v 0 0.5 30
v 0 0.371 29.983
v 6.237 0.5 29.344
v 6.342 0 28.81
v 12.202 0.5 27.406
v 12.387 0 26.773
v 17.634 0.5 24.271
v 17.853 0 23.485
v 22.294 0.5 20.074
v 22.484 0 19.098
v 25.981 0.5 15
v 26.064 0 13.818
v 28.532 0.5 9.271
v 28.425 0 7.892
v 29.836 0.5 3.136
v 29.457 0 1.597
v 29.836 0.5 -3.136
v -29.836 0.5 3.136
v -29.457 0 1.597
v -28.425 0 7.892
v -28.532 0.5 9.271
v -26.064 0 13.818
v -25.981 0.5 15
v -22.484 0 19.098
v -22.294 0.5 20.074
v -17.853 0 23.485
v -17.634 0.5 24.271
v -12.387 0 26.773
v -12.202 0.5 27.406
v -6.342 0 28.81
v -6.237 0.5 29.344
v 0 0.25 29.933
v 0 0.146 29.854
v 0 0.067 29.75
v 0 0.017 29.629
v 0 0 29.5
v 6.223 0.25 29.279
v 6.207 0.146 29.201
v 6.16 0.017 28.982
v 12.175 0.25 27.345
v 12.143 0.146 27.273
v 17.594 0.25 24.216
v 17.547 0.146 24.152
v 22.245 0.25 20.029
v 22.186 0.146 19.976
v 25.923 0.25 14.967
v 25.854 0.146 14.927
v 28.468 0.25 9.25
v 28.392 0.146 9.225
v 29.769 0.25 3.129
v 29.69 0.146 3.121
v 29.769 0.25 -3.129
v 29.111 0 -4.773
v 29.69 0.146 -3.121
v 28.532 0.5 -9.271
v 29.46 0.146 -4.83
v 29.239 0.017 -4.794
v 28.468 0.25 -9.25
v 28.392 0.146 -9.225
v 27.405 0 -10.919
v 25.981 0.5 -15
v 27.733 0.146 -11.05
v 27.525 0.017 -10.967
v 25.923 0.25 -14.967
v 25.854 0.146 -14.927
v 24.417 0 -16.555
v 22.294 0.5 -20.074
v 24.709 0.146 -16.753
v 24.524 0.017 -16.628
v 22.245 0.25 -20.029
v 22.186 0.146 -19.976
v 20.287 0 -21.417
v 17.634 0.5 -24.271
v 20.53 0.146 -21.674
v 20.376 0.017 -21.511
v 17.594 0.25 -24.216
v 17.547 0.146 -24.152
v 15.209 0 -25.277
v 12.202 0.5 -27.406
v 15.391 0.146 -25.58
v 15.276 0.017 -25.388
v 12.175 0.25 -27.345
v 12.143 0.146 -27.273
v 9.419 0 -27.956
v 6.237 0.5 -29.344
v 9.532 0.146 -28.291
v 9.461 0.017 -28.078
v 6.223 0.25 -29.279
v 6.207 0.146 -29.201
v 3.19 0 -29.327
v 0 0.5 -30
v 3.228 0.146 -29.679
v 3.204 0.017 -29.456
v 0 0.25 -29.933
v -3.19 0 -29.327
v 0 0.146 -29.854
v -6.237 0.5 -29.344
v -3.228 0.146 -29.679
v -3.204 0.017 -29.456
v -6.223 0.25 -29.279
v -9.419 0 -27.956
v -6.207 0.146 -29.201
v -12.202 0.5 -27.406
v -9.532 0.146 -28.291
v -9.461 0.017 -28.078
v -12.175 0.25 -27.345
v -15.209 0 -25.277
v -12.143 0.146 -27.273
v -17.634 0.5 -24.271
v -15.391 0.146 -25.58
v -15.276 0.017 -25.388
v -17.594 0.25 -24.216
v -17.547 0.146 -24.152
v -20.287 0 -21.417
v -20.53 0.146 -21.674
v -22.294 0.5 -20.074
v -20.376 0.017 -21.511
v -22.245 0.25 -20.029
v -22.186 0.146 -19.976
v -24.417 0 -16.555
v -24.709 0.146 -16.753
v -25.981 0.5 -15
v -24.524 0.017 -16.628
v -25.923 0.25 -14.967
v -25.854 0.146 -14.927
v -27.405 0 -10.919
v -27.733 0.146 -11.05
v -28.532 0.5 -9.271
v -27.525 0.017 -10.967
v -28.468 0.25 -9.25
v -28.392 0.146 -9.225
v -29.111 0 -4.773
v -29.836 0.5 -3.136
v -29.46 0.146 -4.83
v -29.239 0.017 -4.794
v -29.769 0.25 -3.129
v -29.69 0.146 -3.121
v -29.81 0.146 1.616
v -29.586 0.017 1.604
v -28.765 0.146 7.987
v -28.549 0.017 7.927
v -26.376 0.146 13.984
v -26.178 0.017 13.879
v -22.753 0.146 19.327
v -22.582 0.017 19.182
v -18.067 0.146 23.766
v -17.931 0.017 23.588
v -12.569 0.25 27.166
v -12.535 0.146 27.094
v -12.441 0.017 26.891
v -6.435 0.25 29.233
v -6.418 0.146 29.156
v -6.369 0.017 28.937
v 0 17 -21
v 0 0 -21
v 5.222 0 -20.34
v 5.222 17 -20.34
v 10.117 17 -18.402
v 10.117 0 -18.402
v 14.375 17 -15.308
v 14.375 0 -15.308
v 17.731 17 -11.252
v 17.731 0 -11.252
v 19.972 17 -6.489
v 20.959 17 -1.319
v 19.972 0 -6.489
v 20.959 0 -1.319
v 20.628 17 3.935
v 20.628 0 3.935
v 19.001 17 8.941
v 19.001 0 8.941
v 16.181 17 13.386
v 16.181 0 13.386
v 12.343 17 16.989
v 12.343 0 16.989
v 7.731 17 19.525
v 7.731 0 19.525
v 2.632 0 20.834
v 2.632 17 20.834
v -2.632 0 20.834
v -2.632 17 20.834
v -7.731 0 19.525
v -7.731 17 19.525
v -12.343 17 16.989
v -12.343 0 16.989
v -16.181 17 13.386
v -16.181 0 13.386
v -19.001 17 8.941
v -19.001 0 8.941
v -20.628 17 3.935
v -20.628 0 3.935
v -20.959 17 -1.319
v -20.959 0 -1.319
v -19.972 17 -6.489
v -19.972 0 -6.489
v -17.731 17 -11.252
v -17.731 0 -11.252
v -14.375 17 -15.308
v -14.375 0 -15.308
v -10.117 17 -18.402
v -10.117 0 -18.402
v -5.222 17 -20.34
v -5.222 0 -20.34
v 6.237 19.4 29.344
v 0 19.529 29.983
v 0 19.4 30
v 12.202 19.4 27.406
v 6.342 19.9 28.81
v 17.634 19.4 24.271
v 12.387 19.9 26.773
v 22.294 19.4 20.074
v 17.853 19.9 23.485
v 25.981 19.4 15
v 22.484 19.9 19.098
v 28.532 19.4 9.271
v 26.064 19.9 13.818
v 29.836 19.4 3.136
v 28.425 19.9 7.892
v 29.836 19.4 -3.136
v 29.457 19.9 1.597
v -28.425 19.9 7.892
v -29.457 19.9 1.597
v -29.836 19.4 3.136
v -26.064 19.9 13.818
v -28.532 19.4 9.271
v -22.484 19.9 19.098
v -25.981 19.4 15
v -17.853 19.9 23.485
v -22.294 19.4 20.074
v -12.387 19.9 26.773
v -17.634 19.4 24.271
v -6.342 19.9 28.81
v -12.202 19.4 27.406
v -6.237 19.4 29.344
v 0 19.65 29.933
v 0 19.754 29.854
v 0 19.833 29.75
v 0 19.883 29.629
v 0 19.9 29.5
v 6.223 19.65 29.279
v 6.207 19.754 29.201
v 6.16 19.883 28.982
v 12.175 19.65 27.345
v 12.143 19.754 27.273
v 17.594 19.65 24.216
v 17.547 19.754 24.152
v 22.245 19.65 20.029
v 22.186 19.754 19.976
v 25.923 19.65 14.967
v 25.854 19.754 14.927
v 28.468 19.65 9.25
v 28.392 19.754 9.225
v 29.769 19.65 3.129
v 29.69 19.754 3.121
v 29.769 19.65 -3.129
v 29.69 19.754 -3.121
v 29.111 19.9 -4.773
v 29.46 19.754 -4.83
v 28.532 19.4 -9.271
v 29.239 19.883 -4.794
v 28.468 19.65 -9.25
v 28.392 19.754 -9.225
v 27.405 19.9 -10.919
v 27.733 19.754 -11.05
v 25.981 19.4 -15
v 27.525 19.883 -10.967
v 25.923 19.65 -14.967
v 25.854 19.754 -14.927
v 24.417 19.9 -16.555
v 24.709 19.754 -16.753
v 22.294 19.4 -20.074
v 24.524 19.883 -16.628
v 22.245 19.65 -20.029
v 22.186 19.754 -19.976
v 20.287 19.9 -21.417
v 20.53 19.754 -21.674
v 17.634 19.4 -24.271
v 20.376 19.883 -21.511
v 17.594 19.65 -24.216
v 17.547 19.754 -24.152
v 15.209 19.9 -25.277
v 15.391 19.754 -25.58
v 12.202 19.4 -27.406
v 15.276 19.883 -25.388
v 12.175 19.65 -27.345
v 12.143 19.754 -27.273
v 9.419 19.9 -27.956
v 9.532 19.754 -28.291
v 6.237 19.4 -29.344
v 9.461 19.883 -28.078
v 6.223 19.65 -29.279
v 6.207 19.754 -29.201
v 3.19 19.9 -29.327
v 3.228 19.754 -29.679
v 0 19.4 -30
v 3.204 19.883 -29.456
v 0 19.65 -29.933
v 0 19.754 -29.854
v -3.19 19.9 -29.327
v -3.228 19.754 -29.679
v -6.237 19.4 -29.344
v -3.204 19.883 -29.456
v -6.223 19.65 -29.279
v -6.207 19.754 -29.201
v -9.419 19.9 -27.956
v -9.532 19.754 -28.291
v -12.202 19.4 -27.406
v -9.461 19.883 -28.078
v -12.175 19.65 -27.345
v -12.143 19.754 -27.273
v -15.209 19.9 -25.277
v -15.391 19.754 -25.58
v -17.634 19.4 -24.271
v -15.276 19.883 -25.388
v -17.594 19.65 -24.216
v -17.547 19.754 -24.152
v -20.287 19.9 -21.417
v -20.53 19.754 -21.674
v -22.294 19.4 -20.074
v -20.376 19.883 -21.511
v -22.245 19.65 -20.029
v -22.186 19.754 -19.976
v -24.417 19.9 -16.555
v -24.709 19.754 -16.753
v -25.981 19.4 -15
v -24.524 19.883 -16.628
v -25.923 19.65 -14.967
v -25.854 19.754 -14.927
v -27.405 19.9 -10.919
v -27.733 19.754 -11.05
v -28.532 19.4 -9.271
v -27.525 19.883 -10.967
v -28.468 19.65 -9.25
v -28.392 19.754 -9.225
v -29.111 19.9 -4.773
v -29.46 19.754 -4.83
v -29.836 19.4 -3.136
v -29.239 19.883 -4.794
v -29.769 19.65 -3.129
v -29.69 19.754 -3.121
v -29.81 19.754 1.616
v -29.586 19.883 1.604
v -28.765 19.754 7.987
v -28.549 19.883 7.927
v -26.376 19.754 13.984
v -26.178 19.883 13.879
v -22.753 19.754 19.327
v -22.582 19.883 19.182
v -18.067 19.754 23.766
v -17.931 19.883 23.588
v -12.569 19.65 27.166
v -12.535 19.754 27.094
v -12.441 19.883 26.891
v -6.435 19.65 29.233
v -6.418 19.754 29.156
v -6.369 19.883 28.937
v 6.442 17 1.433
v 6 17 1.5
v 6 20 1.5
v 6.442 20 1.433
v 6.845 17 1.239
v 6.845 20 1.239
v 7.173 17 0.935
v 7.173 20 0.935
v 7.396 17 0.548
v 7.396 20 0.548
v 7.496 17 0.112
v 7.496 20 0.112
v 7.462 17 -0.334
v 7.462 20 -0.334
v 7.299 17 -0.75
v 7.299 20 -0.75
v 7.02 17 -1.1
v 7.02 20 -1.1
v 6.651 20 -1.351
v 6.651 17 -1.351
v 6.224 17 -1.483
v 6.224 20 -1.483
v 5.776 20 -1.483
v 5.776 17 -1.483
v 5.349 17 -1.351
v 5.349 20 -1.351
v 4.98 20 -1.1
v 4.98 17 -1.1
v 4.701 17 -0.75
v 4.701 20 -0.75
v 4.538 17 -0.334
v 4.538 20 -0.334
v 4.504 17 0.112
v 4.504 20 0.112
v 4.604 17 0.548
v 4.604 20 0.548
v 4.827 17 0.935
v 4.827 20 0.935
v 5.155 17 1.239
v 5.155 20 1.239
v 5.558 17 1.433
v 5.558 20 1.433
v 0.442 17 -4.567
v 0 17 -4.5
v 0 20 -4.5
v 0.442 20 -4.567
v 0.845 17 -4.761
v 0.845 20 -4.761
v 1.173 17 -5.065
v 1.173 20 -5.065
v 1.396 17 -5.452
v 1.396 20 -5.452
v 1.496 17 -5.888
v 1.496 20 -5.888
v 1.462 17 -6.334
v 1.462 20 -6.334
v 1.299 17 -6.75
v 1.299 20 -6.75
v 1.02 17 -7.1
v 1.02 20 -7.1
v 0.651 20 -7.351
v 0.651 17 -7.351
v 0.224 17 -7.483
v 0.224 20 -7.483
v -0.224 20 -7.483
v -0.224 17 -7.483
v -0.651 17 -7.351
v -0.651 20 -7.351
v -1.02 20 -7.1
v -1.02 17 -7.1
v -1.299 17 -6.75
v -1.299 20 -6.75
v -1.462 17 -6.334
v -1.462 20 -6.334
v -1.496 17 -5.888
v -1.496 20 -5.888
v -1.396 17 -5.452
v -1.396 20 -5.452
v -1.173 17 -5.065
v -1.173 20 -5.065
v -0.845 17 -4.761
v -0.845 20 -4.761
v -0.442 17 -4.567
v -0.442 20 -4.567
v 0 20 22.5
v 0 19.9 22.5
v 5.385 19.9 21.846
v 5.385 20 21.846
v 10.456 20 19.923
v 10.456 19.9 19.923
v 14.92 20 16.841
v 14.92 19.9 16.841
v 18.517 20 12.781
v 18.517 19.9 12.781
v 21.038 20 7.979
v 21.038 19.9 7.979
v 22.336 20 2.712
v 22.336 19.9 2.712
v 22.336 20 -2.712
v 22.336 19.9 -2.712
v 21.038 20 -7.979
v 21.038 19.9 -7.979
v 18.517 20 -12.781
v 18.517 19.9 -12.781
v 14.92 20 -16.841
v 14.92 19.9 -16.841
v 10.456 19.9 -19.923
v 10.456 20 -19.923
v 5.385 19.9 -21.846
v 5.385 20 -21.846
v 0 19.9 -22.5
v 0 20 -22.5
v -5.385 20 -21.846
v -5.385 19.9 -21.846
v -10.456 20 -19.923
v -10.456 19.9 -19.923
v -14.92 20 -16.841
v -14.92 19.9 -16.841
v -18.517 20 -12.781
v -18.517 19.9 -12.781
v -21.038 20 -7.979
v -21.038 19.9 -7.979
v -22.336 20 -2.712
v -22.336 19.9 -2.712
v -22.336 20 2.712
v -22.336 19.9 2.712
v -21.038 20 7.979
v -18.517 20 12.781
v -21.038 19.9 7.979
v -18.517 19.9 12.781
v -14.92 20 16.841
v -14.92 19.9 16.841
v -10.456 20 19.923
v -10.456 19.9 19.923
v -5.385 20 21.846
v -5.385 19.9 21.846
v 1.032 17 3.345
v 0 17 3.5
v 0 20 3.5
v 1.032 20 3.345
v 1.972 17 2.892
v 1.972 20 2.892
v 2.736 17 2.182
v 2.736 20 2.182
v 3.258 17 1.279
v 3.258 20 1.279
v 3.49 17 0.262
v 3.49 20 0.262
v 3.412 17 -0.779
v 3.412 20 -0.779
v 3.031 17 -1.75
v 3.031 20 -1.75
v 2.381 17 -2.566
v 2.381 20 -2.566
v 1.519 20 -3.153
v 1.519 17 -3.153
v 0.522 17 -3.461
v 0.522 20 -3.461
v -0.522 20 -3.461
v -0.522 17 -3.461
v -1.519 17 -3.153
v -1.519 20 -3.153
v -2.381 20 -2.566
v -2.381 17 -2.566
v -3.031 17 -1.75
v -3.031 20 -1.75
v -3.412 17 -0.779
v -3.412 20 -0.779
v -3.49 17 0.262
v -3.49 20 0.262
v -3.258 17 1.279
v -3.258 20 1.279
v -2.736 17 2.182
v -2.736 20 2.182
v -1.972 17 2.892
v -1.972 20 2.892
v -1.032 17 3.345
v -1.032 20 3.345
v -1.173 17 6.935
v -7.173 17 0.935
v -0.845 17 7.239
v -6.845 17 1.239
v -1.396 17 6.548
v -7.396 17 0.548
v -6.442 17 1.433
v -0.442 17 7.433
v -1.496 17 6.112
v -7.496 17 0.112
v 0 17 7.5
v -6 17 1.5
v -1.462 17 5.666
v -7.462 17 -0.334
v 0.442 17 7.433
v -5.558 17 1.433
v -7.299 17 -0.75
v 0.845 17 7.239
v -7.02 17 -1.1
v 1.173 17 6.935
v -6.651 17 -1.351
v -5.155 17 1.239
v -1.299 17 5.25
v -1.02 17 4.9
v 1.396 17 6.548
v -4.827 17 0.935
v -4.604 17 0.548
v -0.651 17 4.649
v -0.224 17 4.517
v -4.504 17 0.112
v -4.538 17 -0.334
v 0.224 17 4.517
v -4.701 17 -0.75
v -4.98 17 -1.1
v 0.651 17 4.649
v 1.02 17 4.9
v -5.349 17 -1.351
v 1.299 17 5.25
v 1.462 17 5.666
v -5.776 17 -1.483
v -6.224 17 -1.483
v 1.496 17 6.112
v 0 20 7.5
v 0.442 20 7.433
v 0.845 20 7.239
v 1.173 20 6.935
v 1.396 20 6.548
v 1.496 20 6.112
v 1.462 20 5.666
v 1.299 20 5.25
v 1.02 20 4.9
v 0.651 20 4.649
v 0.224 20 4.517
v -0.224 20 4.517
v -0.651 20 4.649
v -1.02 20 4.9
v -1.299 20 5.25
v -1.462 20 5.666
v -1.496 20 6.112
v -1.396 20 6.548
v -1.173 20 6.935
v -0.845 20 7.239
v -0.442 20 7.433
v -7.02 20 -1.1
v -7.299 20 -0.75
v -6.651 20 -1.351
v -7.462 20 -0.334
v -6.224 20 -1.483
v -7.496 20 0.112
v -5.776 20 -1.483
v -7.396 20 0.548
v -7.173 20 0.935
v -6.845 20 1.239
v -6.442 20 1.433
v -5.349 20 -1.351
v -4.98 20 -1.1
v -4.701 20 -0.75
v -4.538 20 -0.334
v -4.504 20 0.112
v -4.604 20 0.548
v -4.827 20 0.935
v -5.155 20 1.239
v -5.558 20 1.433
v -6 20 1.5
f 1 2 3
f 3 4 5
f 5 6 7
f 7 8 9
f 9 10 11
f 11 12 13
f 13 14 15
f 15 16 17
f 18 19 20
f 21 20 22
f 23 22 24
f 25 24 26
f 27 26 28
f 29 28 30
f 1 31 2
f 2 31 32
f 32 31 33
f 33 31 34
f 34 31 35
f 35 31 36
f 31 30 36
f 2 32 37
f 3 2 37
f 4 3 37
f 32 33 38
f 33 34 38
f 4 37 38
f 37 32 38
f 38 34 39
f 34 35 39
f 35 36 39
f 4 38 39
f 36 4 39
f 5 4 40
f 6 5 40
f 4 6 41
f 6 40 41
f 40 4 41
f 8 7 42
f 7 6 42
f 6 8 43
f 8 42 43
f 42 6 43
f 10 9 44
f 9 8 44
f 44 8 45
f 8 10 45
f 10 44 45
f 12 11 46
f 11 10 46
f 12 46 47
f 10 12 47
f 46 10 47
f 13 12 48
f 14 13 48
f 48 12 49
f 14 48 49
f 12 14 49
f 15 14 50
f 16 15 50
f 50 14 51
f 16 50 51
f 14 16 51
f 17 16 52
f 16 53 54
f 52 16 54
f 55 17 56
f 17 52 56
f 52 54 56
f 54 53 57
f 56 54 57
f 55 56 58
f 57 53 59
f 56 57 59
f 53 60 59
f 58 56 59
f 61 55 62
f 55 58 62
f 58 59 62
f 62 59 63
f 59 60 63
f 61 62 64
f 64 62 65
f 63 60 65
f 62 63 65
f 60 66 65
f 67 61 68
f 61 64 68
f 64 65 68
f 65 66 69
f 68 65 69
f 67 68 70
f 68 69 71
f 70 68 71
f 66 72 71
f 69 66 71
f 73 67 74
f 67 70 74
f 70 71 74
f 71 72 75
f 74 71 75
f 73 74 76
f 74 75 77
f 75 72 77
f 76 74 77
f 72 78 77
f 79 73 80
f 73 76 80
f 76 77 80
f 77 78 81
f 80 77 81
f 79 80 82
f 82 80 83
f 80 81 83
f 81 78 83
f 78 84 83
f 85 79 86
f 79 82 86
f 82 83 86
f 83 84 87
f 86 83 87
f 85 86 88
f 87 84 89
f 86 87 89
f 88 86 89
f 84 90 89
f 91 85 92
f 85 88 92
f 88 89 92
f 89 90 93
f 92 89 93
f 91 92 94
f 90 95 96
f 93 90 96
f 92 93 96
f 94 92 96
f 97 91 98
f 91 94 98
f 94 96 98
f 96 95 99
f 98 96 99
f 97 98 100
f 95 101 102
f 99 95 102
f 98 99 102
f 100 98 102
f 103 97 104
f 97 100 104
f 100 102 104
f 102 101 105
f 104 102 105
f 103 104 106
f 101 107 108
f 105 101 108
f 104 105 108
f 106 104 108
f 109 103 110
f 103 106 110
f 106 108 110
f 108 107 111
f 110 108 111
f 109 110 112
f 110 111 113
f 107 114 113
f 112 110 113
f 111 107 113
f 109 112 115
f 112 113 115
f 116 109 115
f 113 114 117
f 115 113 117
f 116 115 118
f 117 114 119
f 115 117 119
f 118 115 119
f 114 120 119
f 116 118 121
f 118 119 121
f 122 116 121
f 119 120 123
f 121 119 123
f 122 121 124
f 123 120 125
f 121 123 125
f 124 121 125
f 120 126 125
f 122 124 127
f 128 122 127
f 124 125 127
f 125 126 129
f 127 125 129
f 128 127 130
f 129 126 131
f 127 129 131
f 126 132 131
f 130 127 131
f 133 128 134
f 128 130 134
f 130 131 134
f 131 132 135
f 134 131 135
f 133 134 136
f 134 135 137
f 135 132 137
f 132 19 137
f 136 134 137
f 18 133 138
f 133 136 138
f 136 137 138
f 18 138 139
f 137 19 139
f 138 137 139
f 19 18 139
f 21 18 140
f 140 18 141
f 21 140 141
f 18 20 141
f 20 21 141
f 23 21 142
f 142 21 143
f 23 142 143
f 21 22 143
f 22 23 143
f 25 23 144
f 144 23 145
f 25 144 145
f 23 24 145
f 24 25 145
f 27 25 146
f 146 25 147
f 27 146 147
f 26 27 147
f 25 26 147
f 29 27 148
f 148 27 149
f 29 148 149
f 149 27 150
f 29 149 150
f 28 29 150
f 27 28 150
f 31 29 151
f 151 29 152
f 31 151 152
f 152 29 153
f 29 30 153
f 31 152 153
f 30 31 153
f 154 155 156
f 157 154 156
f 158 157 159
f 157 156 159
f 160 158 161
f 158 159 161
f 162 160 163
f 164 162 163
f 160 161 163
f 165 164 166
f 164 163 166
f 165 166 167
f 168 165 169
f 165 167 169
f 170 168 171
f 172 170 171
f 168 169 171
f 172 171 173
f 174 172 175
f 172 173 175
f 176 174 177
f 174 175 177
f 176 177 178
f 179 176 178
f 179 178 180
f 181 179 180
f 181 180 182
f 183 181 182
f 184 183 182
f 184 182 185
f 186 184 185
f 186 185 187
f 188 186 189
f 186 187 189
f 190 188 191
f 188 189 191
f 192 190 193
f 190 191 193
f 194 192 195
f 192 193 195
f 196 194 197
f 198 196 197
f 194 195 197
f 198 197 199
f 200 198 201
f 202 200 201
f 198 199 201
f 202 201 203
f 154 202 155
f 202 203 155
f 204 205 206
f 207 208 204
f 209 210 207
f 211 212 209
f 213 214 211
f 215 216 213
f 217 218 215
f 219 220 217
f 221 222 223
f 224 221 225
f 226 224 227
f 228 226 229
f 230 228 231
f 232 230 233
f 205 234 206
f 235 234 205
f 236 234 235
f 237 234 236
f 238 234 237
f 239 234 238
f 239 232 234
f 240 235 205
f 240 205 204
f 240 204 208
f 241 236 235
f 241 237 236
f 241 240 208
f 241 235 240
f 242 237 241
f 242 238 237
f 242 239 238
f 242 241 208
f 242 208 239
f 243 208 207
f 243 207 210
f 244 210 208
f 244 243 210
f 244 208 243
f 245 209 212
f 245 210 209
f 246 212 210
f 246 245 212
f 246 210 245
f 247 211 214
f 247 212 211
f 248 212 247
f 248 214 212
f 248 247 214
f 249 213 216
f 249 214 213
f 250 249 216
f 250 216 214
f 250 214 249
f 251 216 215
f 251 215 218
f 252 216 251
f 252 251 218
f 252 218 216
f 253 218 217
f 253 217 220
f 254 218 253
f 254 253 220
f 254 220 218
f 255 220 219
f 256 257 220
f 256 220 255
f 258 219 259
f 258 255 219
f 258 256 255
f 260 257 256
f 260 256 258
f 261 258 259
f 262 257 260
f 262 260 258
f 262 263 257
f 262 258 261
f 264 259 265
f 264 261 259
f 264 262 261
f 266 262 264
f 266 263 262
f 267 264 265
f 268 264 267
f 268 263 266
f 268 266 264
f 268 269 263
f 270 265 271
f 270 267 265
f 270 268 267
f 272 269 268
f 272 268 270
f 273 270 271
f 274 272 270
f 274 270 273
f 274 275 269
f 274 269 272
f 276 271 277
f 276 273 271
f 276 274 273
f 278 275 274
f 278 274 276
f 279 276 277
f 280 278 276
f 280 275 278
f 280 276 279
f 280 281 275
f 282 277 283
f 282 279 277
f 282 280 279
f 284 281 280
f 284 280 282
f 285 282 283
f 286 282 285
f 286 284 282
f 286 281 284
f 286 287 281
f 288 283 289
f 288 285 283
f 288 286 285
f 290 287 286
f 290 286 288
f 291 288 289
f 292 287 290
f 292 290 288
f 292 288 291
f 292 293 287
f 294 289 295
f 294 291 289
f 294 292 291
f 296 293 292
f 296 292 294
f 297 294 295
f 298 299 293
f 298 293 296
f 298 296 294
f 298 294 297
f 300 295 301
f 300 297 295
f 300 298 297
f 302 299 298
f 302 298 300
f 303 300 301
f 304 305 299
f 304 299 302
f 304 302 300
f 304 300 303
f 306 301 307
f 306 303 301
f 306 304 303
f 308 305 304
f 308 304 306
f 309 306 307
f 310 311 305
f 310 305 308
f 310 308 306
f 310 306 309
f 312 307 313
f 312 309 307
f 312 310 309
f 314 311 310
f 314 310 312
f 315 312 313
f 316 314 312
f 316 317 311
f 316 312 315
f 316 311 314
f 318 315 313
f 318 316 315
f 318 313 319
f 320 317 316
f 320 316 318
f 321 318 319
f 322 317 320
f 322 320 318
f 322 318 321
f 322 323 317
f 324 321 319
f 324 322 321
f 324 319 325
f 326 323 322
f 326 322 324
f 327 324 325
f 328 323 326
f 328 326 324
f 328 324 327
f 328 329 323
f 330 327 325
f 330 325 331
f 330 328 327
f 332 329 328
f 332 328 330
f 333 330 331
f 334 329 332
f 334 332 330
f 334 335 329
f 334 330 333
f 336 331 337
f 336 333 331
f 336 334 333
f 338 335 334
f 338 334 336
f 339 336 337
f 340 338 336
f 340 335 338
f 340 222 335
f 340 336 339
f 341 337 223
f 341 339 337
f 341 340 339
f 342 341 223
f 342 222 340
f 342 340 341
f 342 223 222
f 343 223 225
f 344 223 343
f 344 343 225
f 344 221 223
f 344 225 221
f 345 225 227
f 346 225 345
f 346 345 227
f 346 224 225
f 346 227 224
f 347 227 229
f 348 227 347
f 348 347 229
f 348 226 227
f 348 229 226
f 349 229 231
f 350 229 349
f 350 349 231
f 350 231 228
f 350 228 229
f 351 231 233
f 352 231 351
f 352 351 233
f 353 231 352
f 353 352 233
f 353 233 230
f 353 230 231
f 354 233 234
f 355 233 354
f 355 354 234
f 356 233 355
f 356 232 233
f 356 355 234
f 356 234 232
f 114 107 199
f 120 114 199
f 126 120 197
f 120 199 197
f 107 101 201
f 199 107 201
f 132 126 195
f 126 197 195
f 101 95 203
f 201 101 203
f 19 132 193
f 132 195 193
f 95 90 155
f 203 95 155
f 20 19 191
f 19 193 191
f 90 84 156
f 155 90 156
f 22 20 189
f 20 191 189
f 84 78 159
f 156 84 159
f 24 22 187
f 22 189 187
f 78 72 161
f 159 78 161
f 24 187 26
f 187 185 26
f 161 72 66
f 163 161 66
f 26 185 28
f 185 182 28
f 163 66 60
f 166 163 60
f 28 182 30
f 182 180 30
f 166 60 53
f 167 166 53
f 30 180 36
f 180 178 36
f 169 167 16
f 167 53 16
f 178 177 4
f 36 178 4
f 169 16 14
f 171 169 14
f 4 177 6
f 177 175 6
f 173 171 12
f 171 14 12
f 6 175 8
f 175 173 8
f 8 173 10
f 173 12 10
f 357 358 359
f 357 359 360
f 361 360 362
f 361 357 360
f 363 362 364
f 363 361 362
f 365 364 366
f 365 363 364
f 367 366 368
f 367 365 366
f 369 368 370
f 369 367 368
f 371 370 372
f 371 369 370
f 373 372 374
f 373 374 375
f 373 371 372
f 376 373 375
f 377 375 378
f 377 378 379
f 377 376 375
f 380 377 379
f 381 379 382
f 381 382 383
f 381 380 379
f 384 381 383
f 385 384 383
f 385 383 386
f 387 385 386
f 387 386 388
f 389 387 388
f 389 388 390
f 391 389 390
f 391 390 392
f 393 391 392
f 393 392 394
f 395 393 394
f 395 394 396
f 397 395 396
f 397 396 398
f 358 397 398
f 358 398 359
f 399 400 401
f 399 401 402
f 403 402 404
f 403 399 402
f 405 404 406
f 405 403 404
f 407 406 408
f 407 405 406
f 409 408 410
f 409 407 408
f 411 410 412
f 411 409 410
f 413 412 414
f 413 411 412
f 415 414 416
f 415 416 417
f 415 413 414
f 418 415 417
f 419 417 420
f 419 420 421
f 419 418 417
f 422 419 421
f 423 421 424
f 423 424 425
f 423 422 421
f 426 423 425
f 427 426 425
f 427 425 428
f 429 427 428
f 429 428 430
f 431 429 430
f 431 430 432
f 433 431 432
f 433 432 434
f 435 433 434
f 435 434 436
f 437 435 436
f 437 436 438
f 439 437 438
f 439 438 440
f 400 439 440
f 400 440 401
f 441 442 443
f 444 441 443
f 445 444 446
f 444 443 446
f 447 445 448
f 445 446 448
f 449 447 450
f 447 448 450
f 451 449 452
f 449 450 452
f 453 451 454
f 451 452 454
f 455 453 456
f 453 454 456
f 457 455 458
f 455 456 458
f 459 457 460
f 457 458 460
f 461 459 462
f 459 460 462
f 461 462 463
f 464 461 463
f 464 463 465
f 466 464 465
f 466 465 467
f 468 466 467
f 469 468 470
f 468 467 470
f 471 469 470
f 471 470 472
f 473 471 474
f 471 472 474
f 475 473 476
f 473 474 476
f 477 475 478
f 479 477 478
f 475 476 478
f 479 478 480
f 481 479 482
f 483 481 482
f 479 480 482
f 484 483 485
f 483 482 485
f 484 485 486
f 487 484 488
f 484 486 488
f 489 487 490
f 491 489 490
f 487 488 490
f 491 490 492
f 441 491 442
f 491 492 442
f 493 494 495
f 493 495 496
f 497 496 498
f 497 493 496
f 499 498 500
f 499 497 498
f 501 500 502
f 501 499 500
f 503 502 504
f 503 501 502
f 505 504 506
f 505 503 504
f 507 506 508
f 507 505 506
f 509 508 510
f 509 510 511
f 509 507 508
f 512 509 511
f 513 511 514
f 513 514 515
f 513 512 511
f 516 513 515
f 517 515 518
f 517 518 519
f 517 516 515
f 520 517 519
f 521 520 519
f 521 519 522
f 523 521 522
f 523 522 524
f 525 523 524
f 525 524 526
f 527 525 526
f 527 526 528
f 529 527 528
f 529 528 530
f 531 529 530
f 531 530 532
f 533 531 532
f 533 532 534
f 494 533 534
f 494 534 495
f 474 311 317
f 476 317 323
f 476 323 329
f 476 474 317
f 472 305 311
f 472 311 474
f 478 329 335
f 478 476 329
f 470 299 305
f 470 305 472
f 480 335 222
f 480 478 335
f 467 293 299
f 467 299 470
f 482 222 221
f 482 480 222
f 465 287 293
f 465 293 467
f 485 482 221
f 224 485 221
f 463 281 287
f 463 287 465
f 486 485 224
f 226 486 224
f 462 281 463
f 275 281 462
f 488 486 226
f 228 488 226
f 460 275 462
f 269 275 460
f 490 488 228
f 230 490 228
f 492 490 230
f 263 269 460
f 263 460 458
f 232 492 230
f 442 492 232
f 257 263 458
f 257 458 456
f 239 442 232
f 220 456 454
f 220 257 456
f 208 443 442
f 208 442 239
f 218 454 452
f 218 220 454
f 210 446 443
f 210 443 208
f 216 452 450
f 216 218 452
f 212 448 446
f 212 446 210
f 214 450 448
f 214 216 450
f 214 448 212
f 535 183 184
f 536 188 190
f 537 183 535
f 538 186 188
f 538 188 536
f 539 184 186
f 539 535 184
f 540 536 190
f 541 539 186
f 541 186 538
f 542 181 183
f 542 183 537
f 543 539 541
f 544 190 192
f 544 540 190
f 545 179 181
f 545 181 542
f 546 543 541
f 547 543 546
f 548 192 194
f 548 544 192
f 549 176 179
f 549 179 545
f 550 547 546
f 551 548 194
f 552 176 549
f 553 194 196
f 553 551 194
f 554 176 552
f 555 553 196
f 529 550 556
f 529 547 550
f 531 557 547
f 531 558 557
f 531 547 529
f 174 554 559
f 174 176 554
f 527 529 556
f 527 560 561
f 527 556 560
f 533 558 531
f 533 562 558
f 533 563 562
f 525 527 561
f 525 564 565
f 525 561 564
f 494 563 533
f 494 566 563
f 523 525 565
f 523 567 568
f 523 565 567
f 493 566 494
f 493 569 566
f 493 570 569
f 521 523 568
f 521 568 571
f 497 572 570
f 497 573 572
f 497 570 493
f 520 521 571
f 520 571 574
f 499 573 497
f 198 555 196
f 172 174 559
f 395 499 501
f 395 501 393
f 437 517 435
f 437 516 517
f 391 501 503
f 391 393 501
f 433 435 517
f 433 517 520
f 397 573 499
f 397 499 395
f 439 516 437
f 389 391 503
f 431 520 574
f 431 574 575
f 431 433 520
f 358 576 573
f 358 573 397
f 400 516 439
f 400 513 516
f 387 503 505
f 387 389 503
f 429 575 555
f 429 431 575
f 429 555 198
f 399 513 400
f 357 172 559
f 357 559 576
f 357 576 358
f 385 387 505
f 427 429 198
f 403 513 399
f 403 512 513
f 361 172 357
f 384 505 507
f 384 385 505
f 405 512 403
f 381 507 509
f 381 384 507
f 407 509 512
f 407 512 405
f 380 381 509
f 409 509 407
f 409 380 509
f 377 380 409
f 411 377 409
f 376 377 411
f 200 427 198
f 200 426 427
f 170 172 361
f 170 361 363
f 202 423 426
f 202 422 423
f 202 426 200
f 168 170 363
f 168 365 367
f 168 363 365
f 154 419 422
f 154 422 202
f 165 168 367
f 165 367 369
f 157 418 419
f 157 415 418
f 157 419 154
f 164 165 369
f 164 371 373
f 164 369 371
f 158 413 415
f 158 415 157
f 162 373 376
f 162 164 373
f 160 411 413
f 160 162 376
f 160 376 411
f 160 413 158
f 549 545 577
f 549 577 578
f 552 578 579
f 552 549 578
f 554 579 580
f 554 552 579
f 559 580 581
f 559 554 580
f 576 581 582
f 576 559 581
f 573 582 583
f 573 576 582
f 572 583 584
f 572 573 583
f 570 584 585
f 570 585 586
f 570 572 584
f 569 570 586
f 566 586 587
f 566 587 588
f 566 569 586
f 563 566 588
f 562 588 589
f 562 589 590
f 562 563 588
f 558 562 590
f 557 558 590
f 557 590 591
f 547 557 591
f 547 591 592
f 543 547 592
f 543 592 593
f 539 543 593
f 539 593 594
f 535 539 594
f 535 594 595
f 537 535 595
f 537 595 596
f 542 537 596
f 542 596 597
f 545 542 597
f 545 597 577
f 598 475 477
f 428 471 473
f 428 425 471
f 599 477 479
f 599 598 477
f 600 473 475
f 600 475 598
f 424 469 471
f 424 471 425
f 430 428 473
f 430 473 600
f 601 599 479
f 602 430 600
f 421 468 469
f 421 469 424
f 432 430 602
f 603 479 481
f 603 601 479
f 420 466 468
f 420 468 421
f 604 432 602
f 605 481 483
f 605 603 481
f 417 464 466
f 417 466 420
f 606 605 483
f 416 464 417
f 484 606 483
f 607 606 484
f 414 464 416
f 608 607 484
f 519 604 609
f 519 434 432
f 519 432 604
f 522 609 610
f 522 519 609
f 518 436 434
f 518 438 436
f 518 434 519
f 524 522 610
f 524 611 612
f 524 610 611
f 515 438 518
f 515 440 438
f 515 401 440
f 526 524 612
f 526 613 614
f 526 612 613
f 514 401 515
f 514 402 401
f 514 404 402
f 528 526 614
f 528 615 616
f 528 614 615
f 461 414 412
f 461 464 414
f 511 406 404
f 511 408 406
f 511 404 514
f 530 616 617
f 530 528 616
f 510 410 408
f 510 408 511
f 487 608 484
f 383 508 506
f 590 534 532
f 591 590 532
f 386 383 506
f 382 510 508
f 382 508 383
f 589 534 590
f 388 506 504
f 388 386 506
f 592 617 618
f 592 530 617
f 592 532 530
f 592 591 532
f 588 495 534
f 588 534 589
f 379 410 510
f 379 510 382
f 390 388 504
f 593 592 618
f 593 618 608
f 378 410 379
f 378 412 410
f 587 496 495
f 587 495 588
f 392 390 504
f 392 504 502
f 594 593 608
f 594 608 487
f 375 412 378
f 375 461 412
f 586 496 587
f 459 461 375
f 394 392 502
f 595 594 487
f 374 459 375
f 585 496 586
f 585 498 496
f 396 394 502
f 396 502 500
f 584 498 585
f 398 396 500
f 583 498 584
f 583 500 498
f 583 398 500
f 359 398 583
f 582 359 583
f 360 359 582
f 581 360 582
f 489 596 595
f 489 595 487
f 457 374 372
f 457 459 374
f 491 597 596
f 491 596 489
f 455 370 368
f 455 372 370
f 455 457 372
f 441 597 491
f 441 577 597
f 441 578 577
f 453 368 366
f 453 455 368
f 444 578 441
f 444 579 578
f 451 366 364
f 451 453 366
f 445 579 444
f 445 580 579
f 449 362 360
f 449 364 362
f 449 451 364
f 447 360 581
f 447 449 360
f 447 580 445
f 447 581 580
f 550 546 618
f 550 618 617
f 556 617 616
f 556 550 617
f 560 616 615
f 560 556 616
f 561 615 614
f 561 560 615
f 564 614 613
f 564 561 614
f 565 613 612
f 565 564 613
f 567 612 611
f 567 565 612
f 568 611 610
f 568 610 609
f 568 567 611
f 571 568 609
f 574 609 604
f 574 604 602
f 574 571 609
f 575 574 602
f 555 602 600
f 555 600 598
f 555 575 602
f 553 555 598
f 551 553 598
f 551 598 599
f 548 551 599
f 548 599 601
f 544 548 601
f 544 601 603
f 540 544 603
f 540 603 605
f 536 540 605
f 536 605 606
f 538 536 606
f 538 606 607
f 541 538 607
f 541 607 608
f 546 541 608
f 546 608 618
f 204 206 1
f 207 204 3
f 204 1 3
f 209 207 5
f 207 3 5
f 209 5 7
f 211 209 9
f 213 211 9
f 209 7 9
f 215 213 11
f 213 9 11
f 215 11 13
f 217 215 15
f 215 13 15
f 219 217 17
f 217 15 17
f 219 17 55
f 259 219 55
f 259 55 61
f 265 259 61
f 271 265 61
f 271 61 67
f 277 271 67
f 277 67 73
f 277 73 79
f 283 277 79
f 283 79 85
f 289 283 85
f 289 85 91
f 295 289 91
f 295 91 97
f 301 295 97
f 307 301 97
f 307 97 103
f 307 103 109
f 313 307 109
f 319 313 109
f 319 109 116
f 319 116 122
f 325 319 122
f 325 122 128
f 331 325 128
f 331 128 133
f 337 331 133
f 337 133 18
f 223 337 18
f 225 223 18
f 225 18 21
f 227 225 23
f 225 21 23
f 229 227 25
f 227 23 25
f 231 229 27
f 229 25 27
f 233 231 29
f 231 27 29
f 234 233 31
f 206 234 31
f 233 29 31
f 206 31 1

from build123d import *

# Parameters (mm, degrees)
SKETCH_1_R          = 30
SKETCH_1_R_2        = 1.5
SKETCH_1_R_3        = 3.5
EXTRUDE_1_DEPTH     = 20
SKETCH_2_R          = 21
CUT_EXTRUDE_1_DEPTH = 17
CUT_EXTRUDE_START   = -0.1
SKETCH_3_R          = 30
SKETCH_3_R_2        = 22.5
CUT_EXTRUDE_2_DEPTH = 0.1
FILLET_1_R          = 0.5


with BuildPart() as part:
    # 草图1 → 凸台-拉伸1 (new body)
    with BuildSketch(Plane(origin=(0, 0, 0), x_dir=(1, 0, 0), z_dir=(0, 1, 0))):
        with Locations(Location((0, 0, 0), (0, 0, 270))):
            Circle(SKETCH_1_R)
        with Locations(Location((0, 6, 0), (0, 0, 270))):
            Circle(SKETCH_1_R_2, mode=Mode.SUBTRACT)
        with Locations(Location((0, 0, 0), (0, 0, 270))):
            Circle(SKETCH_1_R_3, mode=Mode.SUBTRACT)
        with Locations(Location((6, 0, 0), (0, 0, 270))):
            Circle(SKETCH_1_R_2, mode=Mode.SUBTRACT)
        with Locations(Location((0, -6, 0), (0, 0, 270))):
            Circle(SKETCH_1_R_2, mode=Mode.SUBTRACT)
        with Locations(Location((-6, 0, 0), (0, 0, 270))):
            Circle(SKETCH_1_R_2, mode=Mode.SUBTRACT)
    extrude(amount=EXTRUDE_1_DEPTH)

    # 草图2 → 切除-拉伸1 (cut)
    with BuildSketch(Plane(origin=(0, 0, 0), x_dir=(-1, 0, 0), z_dir=(0, -1, 0))):
        with Locations(Location((0, 0, 0), (0, 0, 90))):
            Circle(SKETCH_2_R)
    extrude(amount=-CUT_EXTRUDE_1_DEPTH, mode=Mode.SUBTRACT)

    # 草图3 → 切除-拉伸2 (cut)
    with BuildSketch(Plane(origin=(0, 20, 0), x_dir=(1, 0, 0), z_dir=(0, 1, 0)).offset(CUT_EXTRUDE_START)):
        with Locations(Location((0, 0, 0), (0, 0, 270))):
            Circle(SKETCH_3_R)
        with Locations(Location((0, 0, 0), (0, 0, 270))):
            Circle(SKETCH_3_R_2, mode=Mode.SUBTRACT)
    extrude(amount=CUT_EXTRUDE_2_DEPTH, mode=Mode.SUBTRACT)

    # 圆角1
    fillet_1_edges = [part.edges().sort_by_distance(p)[0] for p in [
        (0, 0, -30),
        (0, 19.9, -30),
    ]]
    fillet(fillet_1_edges, radius=FILLET_1_R)


solid = part.part
